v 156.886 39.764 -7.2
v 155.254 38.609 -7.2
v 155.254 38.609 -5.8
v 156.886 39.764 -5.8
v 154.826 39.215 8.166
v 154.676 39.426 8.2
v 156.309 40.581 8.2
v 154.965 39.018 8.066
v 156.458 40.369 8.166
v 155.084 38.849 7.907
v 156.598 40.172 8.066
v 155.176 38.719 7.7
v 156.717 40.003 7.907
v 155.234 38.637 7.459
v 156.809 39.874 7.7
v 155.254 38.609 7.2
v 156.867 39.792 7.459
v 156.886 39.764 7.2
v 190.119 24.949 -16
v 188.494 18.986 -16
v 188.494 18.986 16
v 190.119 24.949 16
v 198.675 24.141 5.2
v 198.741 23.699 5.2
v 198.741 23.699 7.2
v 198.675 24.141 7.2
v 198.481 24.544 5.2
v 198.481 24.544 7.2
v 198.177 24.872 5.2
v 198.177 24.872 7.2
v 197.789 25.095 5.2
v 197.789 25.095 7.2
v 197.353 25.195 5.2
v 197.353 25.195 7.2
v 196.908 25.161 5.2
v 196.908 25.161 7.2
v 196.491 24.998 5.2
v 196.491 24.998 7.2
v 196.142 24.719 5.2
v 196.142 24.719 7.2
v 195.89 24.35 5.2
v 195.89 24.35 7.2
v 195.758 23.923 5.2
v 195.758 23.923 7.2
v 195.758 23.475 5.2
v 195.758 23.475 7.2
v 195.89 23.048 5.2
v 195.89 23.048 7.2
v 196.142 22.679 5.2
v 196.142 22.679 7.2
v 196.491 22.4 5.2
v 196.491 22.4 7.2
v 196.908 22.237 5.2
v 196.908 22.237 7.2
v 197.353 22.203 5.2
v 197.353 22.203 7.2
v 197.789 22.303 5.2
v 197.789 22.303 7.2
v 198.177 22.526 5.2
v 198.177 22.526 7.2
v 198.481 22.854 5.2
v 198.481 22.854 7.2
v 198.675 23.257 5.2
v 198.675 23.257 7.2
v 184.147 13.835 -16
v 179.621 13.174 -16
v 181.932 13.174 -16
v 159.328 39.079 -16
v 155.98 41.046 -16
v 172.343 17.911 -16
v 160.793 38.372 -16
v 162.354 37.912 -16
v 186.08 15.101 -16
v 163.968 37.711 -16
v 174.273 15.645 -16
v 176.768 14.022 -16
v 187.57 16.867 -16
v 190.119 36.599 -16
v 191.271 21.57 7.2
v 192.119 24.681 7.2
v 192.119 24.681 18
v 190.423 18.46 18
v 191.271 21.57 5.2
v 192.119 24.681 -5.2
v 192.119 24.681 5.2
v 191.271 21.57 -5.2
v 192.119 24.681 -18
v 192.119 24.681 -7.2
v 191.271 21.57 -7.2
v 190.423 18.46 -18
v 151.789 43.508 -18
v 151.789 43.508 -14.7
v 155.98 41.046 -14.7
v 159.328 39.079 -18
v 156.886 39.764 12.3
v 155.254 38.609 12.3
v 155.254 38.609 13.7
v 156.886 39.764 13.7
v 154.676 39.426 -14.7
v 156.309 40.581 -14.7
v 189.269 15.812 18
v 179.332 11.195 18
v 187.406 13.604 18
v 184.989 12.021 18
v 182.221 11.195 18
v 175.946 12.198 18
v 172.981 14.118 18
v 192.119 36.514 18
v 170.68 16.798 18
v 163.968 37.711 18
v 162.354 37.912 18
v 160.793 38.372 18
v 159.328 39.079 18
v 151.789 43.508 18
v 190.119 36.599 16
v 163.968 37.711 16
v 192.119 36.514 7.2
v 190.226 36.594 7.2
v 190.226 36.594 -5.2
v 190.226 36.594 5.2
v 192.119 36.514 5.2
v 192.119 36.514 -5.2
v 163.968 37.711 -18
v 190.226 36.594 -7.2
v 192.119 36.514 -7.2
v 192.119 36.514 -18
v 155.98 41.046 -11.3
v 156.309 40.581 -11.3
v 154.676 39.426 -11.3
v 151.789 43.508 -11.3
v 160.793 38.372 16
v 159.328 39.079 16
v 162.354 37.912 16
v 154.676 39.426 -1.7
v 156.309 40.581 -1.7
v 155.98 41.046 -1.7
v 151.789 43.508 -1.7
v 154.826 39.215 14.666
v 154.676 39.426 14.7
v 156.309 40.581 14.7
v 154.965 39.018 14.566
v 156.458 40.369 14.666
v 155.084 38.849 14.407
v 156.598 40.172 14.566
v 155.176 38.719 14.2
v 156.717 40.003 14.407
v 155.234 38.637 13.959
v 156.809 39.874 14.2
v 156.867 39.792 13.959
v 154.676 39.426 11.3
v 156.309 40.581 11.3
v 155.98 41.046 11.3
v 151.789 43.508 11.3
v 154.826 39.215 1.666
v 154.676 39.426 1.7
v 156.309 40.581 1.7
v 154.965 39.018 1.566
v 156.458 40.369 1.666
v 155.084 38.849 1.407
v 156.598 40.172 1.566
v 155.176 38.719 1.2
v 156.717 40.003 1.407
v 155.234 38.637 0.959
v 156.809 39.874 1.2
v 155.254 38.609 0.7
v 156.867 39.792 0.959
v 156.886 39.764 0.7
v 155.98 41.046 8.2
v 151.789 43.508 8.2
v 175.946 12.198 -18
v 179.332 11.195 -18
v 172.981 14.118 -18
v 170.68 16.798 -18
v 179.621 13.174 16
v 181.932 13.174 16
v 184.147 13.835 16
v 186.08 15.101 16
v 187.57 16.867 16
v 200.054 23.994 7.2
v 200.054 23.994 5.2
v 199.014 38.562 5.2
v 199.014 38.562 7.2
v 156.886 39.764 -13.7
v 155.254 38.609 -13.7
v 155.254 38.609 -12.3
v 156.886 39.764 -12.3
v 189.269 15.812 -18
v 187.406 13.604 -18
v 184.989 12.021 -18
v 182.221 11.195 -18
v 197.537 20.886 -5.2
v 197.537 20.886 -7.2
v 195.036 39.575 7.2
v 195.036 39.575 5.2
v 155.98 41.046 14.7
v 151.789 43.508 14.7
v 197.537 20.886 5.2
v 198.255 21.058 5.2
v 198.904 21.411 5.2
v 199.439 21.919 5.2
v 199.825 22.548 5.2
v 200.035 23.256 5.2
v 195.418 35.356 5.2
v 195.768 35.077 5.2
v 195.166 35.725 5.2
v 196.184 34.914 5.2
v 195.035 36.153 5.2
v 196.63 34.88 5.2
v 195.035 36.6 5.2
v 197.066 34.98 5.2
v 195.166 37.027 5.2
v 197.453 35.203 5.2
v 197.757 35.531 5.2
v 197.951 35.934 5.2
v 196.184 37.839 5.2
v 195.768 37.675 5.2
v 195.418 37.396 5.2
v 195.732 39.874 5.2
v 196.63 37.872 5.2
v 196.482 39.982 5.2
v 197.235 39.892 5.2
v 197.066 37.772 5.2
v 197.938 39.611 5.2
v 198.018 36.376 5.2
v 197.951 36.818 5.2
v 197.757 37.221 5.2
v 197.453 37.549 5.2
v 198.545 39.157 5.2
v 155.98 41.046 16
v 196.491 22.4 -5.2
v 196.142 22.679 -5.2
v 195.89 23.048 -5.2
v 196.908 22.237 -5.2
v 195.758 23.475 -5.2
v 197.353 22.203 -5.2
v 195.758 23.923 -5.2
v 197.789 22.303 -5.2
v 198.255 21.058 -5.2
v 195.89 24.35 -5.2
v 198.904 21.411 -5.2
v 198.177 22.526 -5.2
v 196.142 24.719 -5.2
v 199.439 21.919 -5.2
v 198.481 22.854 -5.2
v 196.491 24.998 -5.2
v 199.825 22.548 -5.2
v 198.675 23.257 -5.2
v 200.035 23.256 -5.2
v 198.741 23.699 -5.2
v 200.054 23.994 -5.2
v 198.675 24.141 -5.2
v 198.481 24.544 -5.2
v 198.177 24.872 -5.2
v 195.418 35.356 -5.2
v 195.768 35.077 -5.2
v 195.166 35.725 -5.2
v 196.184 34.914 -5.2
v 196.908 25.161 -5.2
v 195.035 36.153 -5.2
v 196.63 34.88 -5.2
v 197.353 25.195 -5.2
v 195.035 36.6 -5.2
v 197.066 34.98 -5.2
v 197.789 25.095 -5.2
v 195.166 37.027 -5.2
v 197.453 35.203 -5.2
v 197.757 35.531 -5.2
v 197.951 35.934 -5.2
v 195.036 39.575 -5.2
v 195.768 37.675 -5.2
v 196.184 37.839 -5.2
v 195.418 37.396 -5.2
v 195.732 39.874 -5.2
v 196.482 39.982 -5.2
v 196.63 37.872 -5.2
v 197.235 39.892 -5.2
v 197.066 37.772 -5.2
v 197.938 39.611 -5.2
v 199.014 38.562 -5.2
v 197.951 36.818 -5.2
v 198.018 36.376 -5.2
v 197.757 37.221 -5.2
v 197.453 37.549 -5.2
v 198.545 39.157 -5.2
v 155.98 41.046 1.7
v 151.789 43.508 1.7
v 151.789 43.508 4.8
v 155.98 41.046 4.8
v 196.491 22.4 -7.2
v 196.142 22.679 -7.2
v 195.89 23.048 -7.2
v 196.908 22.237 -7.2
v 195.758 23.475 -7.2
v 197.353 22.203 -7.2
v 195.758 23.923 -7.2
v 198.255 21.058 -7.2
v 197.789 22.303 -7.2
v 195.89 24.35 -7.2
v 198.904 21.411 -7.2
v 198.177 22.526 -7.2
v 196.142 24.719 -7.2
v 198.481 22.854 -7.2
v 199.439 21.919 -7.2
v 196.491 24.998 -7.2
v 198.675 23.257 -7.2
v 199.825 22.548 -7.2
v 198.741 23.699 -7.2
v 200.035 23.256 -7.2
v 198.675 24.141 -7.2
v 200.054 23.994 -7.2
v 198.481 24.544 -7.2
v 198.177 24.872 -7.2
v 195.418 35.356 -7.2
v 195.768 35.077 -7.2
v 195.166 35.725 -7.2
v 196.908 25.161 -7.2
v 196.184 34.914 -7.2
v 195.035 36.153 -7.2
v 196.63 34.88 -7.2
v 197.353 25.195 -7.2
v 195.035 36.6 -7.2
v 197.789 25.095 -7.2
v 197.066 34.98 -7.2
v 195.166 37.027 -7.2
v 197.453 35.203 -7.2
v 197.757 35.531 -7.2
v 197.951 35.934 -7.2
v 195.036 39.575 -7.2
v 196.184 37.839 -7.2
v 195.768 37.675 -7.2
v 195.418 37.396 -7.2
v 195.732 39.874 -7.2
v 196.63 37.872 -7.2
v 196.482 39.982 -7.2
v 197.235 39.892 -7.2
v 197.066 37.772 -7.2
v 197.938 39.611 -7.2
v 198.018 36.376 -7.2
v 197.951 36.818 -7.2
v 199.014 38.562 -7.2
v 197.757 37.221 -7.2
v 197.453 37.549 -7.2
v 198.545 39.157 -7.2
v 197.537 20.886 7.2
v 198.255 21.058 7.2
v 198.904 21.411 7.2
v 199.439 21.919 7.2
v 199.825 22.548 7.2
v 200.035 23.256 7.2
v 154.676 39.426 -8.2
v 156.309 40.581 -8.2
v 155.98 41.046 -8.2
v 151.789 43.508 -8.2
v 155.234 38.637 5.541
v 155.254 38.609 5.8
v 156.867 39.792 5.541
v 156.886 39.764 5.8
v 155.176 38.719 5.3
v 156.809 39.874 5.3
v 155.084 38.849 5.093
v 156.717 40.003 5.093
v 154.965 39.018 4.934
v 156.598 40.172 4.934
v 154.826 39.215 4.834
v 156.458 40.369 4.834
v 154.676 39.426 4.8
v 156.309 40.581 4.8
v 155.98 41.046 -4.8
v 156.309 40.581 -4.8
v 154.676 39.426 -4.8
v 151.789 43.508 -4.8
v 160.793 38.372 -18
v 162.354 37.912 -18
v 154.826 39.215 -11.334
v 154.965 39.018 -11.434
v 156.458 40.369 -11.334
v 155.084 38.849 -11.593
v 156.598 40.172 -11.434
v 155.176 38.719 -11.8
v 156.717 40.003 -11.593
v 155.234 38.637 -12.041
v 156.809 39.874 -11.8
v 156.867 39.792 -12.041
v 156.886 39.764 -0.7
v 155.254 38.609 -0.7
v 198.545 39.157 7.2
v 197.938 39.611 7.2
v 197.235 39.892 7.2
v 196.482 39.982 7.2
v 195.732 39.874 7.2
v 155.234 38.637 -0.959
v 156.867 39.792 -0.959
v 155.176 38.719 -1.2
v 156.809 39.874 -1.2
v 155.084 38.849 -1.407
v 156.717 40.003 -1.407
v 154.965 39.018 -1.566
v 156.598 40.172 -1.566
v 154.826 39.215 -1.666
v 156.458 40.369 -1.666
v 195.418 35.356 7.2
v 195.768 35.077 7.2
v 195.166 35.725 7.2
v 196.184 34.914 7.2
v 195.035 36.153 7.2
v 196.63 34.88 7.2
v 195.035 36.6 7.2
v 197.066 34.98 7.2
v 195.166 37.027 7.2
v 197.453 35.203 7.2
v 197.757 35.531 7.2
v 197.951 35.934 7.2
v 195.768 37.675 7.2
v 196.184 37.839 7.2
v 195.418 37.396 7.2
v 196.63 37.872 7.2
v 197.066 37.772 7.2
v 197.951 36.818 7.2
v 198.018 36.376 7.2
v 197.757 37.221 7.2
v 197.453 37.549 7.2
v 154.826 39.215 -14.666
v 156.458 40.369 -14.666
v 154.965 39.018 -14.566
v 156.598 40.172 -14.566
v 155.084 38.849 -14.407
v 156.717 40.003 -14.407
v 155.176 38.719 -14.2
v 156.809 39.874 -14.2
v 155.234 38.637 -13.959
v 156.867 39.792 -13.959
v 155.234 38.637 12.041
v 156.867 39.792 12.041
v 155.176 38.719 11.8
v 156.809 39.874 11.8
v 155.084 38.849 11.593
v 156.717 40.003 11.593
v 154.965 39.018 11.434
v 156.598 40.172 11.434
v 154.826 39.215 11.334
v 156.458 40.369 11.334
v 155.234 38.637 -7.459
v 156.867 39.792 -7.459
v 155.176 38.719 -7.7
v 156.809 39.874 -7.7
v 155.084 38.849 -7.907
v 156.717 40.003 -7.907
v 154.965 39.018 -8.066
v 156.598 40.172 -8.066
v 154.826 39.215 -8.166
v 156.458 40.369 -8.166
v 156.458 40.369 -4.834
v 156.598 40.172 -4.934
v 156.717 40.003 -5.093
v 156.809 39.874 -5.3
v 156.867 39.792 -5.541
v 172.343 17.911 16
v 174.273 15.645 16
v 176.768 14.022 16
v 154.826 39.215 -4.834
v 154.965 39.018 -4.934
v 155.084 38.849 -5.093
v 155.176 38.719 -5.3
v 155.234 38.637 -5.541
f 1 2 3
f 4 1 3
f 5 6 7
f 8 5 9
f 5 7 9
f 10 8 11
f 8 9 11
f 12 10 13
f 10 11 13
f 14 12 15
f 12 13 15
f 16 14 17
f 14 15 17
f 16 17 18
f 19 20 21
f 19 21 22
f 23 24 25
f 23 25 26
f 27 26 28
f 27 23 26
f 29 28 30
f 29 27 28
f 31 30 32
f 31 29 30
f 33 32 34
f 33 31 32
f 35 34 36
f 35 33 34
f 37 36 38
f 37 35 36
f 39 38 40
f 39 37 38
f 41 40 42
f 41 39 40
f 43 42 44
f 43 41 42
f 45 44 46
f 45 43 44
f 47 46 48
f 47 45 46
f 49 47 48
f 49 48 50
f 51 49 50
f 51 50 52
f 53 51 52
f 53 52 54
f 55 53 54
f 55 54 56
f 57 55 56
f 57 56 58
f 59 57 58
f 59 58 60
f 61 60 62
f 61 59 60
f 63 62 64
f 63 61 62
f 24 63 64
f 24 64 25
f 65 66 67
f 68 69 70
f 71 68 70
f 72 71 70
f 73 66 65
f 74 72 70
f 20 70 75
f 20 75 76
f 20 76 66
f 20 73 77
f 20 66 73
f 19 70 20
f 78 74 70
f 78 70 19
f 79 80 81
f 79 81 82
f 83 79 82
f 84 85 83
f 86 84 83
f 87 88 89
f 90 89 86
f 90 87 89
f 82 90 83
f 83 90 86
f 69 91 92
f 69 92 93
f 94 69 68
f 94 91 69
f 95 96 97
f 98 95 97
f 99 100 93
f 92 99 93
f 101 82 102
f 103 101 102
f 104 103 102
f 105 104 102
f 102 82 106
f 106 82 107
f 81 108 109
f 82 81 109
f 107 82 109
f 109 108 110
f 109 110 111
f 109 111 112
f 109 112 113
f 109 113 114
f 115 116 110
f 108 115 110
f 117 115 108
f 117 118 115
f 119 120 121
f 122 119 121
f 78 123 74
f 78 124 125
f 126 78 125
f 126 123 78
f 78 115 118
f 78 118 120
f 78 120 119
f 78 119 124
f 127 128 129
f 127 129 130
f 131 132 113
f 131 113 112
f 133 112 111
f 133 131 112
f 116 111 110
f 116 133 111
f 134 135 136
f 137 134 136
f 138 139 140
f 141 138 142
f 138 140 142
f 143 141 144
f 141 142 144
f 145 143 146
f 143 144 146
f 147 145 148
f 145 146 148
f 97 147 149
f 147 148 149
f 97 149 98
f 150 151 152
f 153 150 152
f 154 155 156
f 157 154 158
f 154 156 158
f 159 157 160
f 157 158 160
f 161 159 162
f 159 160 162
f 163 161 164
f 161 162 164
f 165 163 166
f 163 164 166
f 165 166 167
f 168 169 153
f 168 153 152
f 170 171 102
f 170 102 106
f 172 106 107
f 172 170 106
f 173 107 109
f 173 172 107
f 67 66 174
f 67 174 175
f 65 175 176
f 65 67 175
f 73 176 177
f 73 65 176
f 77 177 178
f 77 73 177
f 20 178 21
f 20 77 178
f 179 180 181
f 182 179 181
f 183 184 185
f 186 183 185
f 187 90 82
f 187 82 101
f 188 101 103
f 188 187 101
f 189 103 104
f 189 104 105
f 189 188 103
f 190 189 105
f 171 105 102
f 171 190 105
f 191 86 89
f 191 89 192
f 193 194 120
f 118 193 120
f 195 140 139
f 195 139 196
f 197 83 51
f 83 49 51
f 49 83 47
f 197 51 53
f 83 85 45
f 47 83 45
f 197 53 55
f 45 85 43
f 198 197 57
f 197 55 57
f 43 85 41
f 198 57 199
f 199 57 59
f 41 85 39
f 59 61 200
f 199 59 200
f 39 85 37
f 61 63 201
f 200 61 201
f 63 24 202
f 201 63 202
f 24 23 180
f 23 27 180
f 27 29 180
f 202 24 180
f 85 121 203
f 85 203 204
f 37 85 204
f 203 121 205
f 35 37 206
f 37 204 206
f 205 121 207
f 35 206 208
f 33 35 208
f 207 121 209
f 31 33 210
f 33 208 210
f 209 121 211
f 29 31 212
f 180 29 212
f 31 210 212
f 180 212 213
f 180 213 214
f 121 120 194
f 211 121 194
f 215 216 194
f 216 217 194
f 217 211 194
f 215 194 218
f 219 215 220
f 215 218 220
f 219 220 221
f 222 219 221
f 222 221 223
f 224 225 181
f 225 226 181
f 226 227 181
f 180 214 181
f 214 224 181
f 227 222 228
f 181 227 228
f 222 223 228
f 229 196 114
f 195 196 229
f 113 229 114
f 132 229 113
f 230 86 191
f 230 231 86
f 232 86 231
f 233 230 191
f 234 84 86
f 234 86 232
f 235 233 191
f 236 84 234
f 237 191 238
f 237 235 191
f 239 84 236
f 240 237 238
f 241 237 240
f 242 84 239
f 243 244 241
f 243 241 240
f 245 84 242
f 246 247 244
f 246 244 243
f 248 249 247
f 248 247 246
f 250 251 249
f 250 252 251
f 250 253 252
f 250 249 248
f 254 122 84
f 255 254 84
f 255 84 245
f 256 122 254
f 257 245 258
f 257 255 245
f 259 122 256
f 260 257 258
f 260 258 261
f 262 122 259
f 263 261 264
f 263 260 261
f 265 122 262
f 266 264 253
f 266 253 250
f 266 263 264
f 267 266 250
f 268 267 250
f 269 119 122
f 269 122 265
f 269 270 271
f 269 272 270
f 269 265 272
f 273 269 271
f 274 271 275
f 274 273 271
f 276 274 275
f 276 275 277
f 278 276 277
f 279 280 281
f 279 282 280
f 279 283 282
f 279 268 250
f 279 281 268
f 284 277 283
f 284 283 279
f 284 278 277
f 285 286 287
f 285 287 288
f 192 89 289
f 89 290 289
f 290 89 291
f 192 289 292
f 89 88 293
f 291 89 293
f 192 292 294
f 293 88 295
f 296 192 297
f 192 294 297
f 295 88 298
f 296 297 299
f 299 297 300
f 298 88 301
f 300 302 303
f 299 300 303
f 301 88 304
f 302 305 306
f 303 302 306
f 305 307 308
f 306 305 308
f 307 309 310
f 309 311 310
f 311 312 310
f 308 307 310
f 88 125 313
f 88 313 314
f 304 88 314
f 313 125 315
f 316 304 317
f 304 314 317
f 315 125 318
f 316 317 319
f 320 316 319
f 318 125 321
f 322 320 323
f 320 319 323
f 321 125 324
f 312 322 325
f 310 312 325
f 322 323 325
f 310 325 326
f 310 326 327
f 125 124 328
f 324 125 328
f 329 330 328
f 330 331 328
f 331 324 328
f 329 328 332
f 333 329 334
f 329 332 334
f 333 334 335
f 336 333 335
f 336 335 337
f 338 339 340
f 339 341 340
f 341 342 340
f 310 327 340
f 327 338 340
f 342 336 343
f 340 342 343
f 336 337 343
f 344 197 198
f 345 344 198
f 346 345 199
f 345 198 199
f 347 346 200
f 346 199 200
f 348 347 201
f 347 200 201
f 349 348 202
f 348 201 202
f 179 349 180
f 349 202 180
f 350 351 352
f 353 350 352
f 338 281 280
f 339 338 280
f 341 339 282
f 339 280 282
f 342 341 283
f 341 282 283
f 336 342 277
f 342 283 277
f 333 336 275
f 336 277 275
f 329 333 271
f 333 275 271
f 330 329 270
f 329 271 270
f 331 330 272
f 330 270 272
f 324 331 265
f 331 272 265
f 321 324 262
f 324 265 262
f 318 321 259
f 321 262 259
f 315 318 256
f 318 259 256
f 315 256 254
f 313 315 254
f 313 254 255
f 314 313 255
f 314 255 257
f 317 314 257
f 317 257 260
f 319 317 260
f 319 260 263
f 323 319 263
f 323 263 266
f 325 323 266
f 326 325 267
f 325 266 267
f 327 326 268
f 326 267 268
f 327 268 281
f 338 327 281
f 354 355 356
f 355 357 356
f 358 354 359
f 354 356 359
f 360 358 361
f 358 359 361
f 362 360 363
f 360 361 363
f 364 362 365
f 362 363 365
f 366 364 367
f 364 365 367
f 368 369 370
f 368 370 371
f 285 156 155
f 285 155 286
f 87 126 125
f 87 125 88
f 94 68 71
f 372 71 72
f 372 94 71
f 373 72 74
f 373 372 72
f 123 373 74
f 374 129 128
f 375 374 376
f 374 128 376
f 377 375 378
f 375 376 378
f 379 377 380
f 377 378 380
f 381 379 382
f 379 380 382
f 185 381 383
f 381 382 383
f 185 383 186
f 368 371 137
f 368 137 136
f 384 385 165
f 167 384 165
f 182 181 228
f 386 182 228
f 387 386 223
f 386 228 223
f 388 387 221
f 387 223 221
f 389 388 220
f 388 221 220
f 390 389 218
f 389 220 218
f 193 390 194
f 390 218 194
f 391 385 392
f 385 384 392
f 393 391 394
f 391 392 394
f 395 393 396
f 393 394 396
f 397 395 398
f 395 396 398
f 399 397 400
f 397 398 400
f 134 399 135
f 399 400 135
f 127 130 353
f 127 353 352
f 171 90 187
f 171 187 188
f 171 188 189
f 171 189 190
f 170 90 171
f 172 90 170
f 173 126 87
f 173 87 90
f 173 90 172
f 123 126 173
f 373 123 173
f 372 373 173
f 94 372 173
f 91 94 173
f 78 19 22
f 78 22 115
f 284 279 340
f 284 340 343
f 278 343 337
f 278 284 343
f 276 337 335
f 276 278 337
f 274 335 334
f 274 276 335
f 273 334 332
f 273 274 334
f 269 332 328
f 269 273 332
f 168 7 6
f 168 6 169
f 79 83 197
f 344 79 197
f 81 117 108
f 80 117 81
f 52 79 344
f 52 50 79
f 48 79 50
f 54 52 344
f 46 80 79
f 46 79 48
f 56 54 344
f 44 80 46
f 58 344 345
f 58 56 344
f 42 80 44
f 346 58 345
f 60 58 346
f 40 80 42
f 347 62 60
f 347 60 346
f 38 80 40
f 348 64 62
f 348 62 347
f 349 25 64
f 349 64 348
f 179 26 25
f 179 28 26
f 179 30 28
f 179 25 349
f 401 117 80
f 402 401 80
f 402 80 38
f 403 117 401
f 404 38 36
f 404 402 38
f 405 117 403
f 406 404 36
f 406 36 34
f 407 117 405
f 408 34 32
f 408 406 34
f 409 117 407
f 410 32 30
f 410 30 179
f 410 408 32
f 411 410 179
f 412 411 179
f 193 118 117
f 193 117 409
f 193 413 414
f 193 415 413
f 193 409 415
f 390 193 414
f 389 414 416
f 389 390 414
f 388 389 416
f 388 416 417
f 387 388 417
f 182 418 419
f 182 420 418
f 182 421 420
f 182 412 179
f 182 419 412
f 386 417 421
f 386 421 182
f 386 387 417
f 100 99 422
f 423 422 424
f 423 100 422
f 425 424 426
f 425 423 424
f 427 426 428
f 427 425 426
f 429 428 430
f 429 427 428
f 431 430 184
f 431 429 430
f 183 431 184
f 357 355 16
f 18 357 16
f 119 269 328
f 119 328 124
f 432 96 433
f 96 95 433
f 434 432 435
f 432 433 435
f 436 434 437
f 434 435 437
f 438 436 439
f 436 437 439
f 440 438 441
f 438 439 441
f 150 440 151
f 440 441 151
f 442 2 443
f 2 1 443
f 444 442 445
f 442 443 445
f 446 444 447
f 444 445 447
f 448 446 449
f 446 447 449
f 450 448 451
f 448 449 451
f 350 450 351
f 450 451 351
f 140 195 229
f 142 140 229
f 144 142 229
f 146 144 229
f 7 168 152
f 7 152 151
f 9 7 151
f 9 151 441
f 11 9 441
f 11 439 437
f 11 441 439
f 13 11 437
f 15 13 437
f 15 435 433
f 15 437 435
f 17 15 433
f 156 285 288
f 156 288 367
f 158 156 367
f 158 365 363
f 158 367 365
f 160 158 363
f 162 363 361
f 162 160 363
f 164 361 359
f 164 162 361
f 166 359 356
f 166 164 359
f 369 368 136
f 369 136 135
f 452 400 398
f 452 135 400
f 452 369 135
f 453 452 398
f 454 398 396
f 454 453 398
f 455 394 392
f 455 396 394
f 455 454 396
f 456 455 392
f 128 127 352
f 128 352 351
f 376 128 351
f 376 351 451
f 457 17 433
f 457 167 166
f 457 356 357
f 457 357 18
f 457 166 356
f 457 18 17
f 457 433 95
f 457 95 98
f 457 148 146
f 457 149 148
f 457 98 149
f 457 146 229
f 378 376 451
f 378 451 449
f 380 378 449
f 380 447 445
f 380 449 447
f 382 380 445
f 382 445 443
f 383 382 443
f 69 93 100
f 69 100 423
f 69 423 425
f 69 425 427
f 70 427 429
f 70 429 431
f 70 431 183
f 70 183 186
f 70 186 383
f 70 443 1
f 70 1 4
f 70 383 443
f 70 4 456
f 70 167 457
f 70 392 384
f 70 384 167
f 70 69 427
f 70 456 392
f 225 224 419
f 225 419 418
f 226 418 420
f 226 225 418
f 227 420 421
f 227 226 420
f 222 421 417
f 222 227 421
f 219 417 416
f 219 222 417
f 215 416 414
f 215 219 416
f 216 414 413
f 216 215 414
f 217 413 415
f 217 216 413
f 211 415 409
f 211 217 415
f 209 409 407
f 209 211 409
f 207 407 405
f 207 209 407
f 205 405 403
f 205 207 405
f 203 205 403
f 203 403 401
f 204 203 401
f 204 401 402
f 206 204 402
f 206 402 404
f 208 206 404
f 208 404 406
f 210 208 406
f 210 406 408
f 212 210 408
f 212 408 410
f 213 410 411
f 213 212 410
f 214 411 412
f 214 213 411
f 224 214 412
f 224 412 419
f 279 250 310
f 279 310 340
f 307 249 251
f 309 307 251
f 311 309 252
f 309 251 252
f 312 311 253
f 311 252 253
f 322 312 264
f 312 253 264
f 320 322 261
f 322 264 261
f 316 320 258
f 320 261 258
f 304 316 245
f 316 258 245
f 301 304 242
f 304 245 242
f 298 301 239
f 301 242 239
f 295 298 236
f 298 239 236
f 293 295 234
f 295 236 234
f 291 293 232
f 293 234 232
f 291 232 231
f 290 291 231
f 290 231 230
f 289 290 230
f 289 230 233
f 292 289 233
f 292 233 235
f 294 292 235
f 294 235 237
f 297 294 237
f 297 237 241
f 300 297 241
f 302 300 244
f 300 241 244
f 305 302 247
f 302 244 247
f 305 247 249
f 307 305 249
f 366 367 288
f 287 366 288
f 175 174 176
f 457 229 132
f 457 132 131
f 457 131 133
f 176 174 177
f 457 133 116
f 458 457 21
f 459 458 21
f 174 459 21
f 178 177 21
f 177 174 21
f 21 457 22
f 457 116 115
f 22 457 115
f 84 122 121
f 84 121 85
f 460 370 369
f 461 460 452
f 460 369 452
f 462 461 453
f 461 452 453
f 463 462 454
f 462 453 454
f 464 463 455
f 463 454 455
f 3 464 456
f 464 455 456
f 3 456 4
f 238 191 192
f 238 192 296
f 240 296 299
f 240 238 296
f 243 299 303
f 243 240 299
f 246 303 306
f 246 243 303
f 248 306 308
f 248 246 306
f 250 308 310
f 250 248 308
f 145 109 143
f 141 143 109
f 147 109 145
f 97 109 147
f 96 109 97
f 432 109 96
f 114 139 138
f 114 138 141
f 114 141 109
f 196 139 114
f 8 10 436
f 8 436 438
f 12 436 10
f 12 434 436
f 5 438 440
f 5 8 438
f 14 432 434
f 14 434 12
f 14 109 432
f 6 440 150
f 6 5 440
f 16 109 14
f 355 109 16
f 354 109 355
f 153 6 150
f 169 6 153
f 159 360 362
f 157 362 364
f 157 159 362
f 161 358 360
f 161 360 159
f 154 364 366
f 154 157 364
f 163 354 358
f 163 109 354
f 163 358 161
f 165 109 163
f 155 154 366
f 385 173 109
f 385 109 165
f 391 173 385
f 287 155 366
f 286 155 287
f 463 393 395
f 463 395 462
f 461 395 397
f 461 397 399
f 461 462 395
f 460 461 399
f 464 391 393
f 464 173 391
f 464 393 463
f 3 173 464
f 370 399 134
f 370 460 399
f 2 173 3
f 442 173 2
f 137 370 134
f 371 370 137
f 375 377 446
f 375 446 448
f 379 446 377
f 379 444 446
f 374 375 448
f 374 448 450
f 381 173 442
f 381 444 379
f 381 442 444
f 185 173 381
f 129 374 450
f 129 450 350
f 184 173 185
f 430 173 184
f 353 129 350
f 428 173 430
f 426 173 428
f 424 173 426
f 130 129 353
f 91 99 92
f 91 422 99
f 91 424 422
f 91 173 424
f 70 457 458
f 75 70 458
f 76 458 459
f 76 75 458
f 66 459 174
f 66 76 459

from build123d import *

# Parameters (mm, degrees)
EXTRUDE_1_DEPTH            = 18
EXTRUDE_1_DEPTH_BACK       = 18
SHELL_START                = -16
SHELL_1_DEPTH              = 32
EXTRUDE_START              = 5.2
SKETCH_3_R                 = 1.5
EXTRUDE_4_DEPTH            = 2
SKETCH_4_W                 = 3.4
SKETCH_4_H                 = 6
CUT_EXTRUDE_1_DEPTH        = 10
PATTERN_LINEAR_1_COUNT     = 3
PATTERN_LINEAR_1_PITCH     = 6.5
PATTERN_LINEAR_1_COL_COUNT = 3
PATTERN_LINEAR_1_COL_PITCH = 6.5
FILLET_1_R                 = 1


# Read off the part's stored shape, not the designer's step: 抽壳1
with BuildPart() as part:
    # 草图1 → 凸台-拉伸1 (new, two sides: drawn at the far end of the back side and taken through both)
    with BuildSketch(Plane.XY.offset(-EXTRUDE_1_DEPTH_BACK)):
        with BuildLine():
            Line((151.788918014, 43.508002681), (159.327869649, 39.07926315))
            ThreePointArc((159.327869649, 39.07926315), (161.564024285, 38.110077711), (163.968213283, 37.710599005))
            Line((163.968213283, 37.710599005), (192.119395463, 36.513624191))
            Line((192.119395463, 36.513624191), (192.119395463, 24.680778737))
            Line((192.119395463, 24.680778737), (190.423481116, 18.459832962))
            ThreePointArc((190.423481116, 18.459832962), (186.255085289, 12.72488885), (179.332402452, 11.194669891))
            ThreePointArc((179.332402452, 11.194669891), (174.394698317, 13.051819811), (170.680138106, 16.797746984))
            Line((170.680138106, 16.797746984), (151.788918014, 43.508002681))
        make_face()
    extrude(amount=EXTRUDE_1_DEPTH + EXTRUDE_1_DEPTH_BACK)

    # 抽壳1 outline → 抽壳1 (cut)
    with BuildSketch(Plane.XY.offset(SHELL_START)):
        with BuildLine():
            Line((190.119395463, 24.94850719), (190.119395463, 36.598663235))
            Line((190.119395463, 36.598663235), (163.968213283, 37.710599005))
            ThreePointArc((163.968213283, 37.710599005), (161.564024285, 38.110077711), (159.327869649, 39.07926315))
            Line((159.327869649, 39.07926315), (155.979837332, 41.046056915))
            Line((155.979837332, 41.046056915), (172.342749657, 17.910570164))
            ThreePointArc((172.342749657, 17.910570164), (175.462047648, 14.743395572), (179.621034868, 13.173733136))
            ThreePointArc((179.621034868, 13.173733136), (185.159181138, 14.397908304), (188.493897799, 18.985863593))
            Line((188.493897799, 18.985863593), (190.119395463, 24.94850719))
        make_face()
    extrude(amount=SHELL_1_DEPTH, mode=Mode.SUBTRACT)

    # 草图3 → 凸台-拉伸4 (add)
    with BuildSketch(Plane.XY.offset(EXTRUDE_START)):
        with BuildLine():
            Line((195.035842319, 39.575477762), (190.226405911, 36.594113202))
            Line((190.226405911, 36.594113202), (192.119395463, 36.513624191))
            Line((192.119395463, 36.513624191), (192.119395463, 24.680778737))
            Line((192.119395463, 24.680778737), (191.271438289, 21.570305849))
            Line((191.271438289, 21.570305849), (197.536771011, 20.886144131))
            ThreePointArc((197.536771011, 20.886144131), (199.439234753, 21.918899338), (200.054211557, 23.99441256))
            Line((200.054211557, 23.99441256), (199.013675467, 38.561520293))
            ThreePointArc((199.013675467, 38.561520293), (197.234756361, 39.892335247), (195.035842319, 39.575477762))
        make_face()
        with Locations((197.241357069, 23.698998619)):
            Circle(SKETCH_3_R, mode=Mode.SUBTRACT)
        with Locations((196.517780159, 36.376109938)):
            Circle(SKETCH_3_R, mode=Mode.SUBTRACT)
    extrude_4 = extrude(amount=EXTRUDE_4_DEPTH)

    # 镜向1: 凸台-拉伸4 across plane
    add(extrude_4.mirror(Plane.XY))

    # 草图4 → 切除-拉伸1 (cut)
    with BuildSketch(Plane(origin=(121.688944553, 86.066290803, 0), x_dir=(0, 0, 1), z_dir=(-0.8164358107895011, -0.577436201549998, 0))):
        with Locations((0, -55.12692481)):
            Rectangle(SKETCH_4_W, SKETCH_4_H)
    cut_extrude_1 = extrude(amount=-CUT_EXTRUDE_1_DEPTH, mode=Mode.SUBTRACT)

    # 阵列(线性)1: 切除-拉伸1 ×3
    with Locations(*[(0, 0, -i * PATTERN_LINEAR_1_PITCH) for i in range(1, PATTERN_LINEAR_1_COUNT)]):
        add(cut_extrude_1, mode=Mode.SUBTRACT)

    # 阵列(线性)1 col: 切除-拉伸1 ×3
    with Locations(*[(0, 0, i * PATTERN_LINEAR_1_COL_PITCH) for i in range(1, PATTERN_LINEAR_1_COL_COUNT)]):
        add(cut_extrude_1, mode=Mode.SUBTRACT)

    # 圆角1
    fillet_1_edges = [part.edges().sort_by_distance(p)[0] for p in [
        (156.069971034, 39.186824018, -1.7),
        (156.069971034, 39.186824018, 1.7),
        (156.069971034, 39.186824018, 4.8),
        (156.069971034, 39.186824018, 8.2),
        (156.069971034, 39.186824018, 11.3),
        (156.069971034, 39.186824018, 14.7),
        (156.069971034, 39.186824018, -8.2),
        (156.069971034, 39.186824018, -4.8),
        (156.069971034, 39.186824018, -14.7),
        (156.069971034, 39.186824018, -11.3),
    ]]
    fillet(fillet_1_edges, radius=FILLET_1_R)


solid = part.part
